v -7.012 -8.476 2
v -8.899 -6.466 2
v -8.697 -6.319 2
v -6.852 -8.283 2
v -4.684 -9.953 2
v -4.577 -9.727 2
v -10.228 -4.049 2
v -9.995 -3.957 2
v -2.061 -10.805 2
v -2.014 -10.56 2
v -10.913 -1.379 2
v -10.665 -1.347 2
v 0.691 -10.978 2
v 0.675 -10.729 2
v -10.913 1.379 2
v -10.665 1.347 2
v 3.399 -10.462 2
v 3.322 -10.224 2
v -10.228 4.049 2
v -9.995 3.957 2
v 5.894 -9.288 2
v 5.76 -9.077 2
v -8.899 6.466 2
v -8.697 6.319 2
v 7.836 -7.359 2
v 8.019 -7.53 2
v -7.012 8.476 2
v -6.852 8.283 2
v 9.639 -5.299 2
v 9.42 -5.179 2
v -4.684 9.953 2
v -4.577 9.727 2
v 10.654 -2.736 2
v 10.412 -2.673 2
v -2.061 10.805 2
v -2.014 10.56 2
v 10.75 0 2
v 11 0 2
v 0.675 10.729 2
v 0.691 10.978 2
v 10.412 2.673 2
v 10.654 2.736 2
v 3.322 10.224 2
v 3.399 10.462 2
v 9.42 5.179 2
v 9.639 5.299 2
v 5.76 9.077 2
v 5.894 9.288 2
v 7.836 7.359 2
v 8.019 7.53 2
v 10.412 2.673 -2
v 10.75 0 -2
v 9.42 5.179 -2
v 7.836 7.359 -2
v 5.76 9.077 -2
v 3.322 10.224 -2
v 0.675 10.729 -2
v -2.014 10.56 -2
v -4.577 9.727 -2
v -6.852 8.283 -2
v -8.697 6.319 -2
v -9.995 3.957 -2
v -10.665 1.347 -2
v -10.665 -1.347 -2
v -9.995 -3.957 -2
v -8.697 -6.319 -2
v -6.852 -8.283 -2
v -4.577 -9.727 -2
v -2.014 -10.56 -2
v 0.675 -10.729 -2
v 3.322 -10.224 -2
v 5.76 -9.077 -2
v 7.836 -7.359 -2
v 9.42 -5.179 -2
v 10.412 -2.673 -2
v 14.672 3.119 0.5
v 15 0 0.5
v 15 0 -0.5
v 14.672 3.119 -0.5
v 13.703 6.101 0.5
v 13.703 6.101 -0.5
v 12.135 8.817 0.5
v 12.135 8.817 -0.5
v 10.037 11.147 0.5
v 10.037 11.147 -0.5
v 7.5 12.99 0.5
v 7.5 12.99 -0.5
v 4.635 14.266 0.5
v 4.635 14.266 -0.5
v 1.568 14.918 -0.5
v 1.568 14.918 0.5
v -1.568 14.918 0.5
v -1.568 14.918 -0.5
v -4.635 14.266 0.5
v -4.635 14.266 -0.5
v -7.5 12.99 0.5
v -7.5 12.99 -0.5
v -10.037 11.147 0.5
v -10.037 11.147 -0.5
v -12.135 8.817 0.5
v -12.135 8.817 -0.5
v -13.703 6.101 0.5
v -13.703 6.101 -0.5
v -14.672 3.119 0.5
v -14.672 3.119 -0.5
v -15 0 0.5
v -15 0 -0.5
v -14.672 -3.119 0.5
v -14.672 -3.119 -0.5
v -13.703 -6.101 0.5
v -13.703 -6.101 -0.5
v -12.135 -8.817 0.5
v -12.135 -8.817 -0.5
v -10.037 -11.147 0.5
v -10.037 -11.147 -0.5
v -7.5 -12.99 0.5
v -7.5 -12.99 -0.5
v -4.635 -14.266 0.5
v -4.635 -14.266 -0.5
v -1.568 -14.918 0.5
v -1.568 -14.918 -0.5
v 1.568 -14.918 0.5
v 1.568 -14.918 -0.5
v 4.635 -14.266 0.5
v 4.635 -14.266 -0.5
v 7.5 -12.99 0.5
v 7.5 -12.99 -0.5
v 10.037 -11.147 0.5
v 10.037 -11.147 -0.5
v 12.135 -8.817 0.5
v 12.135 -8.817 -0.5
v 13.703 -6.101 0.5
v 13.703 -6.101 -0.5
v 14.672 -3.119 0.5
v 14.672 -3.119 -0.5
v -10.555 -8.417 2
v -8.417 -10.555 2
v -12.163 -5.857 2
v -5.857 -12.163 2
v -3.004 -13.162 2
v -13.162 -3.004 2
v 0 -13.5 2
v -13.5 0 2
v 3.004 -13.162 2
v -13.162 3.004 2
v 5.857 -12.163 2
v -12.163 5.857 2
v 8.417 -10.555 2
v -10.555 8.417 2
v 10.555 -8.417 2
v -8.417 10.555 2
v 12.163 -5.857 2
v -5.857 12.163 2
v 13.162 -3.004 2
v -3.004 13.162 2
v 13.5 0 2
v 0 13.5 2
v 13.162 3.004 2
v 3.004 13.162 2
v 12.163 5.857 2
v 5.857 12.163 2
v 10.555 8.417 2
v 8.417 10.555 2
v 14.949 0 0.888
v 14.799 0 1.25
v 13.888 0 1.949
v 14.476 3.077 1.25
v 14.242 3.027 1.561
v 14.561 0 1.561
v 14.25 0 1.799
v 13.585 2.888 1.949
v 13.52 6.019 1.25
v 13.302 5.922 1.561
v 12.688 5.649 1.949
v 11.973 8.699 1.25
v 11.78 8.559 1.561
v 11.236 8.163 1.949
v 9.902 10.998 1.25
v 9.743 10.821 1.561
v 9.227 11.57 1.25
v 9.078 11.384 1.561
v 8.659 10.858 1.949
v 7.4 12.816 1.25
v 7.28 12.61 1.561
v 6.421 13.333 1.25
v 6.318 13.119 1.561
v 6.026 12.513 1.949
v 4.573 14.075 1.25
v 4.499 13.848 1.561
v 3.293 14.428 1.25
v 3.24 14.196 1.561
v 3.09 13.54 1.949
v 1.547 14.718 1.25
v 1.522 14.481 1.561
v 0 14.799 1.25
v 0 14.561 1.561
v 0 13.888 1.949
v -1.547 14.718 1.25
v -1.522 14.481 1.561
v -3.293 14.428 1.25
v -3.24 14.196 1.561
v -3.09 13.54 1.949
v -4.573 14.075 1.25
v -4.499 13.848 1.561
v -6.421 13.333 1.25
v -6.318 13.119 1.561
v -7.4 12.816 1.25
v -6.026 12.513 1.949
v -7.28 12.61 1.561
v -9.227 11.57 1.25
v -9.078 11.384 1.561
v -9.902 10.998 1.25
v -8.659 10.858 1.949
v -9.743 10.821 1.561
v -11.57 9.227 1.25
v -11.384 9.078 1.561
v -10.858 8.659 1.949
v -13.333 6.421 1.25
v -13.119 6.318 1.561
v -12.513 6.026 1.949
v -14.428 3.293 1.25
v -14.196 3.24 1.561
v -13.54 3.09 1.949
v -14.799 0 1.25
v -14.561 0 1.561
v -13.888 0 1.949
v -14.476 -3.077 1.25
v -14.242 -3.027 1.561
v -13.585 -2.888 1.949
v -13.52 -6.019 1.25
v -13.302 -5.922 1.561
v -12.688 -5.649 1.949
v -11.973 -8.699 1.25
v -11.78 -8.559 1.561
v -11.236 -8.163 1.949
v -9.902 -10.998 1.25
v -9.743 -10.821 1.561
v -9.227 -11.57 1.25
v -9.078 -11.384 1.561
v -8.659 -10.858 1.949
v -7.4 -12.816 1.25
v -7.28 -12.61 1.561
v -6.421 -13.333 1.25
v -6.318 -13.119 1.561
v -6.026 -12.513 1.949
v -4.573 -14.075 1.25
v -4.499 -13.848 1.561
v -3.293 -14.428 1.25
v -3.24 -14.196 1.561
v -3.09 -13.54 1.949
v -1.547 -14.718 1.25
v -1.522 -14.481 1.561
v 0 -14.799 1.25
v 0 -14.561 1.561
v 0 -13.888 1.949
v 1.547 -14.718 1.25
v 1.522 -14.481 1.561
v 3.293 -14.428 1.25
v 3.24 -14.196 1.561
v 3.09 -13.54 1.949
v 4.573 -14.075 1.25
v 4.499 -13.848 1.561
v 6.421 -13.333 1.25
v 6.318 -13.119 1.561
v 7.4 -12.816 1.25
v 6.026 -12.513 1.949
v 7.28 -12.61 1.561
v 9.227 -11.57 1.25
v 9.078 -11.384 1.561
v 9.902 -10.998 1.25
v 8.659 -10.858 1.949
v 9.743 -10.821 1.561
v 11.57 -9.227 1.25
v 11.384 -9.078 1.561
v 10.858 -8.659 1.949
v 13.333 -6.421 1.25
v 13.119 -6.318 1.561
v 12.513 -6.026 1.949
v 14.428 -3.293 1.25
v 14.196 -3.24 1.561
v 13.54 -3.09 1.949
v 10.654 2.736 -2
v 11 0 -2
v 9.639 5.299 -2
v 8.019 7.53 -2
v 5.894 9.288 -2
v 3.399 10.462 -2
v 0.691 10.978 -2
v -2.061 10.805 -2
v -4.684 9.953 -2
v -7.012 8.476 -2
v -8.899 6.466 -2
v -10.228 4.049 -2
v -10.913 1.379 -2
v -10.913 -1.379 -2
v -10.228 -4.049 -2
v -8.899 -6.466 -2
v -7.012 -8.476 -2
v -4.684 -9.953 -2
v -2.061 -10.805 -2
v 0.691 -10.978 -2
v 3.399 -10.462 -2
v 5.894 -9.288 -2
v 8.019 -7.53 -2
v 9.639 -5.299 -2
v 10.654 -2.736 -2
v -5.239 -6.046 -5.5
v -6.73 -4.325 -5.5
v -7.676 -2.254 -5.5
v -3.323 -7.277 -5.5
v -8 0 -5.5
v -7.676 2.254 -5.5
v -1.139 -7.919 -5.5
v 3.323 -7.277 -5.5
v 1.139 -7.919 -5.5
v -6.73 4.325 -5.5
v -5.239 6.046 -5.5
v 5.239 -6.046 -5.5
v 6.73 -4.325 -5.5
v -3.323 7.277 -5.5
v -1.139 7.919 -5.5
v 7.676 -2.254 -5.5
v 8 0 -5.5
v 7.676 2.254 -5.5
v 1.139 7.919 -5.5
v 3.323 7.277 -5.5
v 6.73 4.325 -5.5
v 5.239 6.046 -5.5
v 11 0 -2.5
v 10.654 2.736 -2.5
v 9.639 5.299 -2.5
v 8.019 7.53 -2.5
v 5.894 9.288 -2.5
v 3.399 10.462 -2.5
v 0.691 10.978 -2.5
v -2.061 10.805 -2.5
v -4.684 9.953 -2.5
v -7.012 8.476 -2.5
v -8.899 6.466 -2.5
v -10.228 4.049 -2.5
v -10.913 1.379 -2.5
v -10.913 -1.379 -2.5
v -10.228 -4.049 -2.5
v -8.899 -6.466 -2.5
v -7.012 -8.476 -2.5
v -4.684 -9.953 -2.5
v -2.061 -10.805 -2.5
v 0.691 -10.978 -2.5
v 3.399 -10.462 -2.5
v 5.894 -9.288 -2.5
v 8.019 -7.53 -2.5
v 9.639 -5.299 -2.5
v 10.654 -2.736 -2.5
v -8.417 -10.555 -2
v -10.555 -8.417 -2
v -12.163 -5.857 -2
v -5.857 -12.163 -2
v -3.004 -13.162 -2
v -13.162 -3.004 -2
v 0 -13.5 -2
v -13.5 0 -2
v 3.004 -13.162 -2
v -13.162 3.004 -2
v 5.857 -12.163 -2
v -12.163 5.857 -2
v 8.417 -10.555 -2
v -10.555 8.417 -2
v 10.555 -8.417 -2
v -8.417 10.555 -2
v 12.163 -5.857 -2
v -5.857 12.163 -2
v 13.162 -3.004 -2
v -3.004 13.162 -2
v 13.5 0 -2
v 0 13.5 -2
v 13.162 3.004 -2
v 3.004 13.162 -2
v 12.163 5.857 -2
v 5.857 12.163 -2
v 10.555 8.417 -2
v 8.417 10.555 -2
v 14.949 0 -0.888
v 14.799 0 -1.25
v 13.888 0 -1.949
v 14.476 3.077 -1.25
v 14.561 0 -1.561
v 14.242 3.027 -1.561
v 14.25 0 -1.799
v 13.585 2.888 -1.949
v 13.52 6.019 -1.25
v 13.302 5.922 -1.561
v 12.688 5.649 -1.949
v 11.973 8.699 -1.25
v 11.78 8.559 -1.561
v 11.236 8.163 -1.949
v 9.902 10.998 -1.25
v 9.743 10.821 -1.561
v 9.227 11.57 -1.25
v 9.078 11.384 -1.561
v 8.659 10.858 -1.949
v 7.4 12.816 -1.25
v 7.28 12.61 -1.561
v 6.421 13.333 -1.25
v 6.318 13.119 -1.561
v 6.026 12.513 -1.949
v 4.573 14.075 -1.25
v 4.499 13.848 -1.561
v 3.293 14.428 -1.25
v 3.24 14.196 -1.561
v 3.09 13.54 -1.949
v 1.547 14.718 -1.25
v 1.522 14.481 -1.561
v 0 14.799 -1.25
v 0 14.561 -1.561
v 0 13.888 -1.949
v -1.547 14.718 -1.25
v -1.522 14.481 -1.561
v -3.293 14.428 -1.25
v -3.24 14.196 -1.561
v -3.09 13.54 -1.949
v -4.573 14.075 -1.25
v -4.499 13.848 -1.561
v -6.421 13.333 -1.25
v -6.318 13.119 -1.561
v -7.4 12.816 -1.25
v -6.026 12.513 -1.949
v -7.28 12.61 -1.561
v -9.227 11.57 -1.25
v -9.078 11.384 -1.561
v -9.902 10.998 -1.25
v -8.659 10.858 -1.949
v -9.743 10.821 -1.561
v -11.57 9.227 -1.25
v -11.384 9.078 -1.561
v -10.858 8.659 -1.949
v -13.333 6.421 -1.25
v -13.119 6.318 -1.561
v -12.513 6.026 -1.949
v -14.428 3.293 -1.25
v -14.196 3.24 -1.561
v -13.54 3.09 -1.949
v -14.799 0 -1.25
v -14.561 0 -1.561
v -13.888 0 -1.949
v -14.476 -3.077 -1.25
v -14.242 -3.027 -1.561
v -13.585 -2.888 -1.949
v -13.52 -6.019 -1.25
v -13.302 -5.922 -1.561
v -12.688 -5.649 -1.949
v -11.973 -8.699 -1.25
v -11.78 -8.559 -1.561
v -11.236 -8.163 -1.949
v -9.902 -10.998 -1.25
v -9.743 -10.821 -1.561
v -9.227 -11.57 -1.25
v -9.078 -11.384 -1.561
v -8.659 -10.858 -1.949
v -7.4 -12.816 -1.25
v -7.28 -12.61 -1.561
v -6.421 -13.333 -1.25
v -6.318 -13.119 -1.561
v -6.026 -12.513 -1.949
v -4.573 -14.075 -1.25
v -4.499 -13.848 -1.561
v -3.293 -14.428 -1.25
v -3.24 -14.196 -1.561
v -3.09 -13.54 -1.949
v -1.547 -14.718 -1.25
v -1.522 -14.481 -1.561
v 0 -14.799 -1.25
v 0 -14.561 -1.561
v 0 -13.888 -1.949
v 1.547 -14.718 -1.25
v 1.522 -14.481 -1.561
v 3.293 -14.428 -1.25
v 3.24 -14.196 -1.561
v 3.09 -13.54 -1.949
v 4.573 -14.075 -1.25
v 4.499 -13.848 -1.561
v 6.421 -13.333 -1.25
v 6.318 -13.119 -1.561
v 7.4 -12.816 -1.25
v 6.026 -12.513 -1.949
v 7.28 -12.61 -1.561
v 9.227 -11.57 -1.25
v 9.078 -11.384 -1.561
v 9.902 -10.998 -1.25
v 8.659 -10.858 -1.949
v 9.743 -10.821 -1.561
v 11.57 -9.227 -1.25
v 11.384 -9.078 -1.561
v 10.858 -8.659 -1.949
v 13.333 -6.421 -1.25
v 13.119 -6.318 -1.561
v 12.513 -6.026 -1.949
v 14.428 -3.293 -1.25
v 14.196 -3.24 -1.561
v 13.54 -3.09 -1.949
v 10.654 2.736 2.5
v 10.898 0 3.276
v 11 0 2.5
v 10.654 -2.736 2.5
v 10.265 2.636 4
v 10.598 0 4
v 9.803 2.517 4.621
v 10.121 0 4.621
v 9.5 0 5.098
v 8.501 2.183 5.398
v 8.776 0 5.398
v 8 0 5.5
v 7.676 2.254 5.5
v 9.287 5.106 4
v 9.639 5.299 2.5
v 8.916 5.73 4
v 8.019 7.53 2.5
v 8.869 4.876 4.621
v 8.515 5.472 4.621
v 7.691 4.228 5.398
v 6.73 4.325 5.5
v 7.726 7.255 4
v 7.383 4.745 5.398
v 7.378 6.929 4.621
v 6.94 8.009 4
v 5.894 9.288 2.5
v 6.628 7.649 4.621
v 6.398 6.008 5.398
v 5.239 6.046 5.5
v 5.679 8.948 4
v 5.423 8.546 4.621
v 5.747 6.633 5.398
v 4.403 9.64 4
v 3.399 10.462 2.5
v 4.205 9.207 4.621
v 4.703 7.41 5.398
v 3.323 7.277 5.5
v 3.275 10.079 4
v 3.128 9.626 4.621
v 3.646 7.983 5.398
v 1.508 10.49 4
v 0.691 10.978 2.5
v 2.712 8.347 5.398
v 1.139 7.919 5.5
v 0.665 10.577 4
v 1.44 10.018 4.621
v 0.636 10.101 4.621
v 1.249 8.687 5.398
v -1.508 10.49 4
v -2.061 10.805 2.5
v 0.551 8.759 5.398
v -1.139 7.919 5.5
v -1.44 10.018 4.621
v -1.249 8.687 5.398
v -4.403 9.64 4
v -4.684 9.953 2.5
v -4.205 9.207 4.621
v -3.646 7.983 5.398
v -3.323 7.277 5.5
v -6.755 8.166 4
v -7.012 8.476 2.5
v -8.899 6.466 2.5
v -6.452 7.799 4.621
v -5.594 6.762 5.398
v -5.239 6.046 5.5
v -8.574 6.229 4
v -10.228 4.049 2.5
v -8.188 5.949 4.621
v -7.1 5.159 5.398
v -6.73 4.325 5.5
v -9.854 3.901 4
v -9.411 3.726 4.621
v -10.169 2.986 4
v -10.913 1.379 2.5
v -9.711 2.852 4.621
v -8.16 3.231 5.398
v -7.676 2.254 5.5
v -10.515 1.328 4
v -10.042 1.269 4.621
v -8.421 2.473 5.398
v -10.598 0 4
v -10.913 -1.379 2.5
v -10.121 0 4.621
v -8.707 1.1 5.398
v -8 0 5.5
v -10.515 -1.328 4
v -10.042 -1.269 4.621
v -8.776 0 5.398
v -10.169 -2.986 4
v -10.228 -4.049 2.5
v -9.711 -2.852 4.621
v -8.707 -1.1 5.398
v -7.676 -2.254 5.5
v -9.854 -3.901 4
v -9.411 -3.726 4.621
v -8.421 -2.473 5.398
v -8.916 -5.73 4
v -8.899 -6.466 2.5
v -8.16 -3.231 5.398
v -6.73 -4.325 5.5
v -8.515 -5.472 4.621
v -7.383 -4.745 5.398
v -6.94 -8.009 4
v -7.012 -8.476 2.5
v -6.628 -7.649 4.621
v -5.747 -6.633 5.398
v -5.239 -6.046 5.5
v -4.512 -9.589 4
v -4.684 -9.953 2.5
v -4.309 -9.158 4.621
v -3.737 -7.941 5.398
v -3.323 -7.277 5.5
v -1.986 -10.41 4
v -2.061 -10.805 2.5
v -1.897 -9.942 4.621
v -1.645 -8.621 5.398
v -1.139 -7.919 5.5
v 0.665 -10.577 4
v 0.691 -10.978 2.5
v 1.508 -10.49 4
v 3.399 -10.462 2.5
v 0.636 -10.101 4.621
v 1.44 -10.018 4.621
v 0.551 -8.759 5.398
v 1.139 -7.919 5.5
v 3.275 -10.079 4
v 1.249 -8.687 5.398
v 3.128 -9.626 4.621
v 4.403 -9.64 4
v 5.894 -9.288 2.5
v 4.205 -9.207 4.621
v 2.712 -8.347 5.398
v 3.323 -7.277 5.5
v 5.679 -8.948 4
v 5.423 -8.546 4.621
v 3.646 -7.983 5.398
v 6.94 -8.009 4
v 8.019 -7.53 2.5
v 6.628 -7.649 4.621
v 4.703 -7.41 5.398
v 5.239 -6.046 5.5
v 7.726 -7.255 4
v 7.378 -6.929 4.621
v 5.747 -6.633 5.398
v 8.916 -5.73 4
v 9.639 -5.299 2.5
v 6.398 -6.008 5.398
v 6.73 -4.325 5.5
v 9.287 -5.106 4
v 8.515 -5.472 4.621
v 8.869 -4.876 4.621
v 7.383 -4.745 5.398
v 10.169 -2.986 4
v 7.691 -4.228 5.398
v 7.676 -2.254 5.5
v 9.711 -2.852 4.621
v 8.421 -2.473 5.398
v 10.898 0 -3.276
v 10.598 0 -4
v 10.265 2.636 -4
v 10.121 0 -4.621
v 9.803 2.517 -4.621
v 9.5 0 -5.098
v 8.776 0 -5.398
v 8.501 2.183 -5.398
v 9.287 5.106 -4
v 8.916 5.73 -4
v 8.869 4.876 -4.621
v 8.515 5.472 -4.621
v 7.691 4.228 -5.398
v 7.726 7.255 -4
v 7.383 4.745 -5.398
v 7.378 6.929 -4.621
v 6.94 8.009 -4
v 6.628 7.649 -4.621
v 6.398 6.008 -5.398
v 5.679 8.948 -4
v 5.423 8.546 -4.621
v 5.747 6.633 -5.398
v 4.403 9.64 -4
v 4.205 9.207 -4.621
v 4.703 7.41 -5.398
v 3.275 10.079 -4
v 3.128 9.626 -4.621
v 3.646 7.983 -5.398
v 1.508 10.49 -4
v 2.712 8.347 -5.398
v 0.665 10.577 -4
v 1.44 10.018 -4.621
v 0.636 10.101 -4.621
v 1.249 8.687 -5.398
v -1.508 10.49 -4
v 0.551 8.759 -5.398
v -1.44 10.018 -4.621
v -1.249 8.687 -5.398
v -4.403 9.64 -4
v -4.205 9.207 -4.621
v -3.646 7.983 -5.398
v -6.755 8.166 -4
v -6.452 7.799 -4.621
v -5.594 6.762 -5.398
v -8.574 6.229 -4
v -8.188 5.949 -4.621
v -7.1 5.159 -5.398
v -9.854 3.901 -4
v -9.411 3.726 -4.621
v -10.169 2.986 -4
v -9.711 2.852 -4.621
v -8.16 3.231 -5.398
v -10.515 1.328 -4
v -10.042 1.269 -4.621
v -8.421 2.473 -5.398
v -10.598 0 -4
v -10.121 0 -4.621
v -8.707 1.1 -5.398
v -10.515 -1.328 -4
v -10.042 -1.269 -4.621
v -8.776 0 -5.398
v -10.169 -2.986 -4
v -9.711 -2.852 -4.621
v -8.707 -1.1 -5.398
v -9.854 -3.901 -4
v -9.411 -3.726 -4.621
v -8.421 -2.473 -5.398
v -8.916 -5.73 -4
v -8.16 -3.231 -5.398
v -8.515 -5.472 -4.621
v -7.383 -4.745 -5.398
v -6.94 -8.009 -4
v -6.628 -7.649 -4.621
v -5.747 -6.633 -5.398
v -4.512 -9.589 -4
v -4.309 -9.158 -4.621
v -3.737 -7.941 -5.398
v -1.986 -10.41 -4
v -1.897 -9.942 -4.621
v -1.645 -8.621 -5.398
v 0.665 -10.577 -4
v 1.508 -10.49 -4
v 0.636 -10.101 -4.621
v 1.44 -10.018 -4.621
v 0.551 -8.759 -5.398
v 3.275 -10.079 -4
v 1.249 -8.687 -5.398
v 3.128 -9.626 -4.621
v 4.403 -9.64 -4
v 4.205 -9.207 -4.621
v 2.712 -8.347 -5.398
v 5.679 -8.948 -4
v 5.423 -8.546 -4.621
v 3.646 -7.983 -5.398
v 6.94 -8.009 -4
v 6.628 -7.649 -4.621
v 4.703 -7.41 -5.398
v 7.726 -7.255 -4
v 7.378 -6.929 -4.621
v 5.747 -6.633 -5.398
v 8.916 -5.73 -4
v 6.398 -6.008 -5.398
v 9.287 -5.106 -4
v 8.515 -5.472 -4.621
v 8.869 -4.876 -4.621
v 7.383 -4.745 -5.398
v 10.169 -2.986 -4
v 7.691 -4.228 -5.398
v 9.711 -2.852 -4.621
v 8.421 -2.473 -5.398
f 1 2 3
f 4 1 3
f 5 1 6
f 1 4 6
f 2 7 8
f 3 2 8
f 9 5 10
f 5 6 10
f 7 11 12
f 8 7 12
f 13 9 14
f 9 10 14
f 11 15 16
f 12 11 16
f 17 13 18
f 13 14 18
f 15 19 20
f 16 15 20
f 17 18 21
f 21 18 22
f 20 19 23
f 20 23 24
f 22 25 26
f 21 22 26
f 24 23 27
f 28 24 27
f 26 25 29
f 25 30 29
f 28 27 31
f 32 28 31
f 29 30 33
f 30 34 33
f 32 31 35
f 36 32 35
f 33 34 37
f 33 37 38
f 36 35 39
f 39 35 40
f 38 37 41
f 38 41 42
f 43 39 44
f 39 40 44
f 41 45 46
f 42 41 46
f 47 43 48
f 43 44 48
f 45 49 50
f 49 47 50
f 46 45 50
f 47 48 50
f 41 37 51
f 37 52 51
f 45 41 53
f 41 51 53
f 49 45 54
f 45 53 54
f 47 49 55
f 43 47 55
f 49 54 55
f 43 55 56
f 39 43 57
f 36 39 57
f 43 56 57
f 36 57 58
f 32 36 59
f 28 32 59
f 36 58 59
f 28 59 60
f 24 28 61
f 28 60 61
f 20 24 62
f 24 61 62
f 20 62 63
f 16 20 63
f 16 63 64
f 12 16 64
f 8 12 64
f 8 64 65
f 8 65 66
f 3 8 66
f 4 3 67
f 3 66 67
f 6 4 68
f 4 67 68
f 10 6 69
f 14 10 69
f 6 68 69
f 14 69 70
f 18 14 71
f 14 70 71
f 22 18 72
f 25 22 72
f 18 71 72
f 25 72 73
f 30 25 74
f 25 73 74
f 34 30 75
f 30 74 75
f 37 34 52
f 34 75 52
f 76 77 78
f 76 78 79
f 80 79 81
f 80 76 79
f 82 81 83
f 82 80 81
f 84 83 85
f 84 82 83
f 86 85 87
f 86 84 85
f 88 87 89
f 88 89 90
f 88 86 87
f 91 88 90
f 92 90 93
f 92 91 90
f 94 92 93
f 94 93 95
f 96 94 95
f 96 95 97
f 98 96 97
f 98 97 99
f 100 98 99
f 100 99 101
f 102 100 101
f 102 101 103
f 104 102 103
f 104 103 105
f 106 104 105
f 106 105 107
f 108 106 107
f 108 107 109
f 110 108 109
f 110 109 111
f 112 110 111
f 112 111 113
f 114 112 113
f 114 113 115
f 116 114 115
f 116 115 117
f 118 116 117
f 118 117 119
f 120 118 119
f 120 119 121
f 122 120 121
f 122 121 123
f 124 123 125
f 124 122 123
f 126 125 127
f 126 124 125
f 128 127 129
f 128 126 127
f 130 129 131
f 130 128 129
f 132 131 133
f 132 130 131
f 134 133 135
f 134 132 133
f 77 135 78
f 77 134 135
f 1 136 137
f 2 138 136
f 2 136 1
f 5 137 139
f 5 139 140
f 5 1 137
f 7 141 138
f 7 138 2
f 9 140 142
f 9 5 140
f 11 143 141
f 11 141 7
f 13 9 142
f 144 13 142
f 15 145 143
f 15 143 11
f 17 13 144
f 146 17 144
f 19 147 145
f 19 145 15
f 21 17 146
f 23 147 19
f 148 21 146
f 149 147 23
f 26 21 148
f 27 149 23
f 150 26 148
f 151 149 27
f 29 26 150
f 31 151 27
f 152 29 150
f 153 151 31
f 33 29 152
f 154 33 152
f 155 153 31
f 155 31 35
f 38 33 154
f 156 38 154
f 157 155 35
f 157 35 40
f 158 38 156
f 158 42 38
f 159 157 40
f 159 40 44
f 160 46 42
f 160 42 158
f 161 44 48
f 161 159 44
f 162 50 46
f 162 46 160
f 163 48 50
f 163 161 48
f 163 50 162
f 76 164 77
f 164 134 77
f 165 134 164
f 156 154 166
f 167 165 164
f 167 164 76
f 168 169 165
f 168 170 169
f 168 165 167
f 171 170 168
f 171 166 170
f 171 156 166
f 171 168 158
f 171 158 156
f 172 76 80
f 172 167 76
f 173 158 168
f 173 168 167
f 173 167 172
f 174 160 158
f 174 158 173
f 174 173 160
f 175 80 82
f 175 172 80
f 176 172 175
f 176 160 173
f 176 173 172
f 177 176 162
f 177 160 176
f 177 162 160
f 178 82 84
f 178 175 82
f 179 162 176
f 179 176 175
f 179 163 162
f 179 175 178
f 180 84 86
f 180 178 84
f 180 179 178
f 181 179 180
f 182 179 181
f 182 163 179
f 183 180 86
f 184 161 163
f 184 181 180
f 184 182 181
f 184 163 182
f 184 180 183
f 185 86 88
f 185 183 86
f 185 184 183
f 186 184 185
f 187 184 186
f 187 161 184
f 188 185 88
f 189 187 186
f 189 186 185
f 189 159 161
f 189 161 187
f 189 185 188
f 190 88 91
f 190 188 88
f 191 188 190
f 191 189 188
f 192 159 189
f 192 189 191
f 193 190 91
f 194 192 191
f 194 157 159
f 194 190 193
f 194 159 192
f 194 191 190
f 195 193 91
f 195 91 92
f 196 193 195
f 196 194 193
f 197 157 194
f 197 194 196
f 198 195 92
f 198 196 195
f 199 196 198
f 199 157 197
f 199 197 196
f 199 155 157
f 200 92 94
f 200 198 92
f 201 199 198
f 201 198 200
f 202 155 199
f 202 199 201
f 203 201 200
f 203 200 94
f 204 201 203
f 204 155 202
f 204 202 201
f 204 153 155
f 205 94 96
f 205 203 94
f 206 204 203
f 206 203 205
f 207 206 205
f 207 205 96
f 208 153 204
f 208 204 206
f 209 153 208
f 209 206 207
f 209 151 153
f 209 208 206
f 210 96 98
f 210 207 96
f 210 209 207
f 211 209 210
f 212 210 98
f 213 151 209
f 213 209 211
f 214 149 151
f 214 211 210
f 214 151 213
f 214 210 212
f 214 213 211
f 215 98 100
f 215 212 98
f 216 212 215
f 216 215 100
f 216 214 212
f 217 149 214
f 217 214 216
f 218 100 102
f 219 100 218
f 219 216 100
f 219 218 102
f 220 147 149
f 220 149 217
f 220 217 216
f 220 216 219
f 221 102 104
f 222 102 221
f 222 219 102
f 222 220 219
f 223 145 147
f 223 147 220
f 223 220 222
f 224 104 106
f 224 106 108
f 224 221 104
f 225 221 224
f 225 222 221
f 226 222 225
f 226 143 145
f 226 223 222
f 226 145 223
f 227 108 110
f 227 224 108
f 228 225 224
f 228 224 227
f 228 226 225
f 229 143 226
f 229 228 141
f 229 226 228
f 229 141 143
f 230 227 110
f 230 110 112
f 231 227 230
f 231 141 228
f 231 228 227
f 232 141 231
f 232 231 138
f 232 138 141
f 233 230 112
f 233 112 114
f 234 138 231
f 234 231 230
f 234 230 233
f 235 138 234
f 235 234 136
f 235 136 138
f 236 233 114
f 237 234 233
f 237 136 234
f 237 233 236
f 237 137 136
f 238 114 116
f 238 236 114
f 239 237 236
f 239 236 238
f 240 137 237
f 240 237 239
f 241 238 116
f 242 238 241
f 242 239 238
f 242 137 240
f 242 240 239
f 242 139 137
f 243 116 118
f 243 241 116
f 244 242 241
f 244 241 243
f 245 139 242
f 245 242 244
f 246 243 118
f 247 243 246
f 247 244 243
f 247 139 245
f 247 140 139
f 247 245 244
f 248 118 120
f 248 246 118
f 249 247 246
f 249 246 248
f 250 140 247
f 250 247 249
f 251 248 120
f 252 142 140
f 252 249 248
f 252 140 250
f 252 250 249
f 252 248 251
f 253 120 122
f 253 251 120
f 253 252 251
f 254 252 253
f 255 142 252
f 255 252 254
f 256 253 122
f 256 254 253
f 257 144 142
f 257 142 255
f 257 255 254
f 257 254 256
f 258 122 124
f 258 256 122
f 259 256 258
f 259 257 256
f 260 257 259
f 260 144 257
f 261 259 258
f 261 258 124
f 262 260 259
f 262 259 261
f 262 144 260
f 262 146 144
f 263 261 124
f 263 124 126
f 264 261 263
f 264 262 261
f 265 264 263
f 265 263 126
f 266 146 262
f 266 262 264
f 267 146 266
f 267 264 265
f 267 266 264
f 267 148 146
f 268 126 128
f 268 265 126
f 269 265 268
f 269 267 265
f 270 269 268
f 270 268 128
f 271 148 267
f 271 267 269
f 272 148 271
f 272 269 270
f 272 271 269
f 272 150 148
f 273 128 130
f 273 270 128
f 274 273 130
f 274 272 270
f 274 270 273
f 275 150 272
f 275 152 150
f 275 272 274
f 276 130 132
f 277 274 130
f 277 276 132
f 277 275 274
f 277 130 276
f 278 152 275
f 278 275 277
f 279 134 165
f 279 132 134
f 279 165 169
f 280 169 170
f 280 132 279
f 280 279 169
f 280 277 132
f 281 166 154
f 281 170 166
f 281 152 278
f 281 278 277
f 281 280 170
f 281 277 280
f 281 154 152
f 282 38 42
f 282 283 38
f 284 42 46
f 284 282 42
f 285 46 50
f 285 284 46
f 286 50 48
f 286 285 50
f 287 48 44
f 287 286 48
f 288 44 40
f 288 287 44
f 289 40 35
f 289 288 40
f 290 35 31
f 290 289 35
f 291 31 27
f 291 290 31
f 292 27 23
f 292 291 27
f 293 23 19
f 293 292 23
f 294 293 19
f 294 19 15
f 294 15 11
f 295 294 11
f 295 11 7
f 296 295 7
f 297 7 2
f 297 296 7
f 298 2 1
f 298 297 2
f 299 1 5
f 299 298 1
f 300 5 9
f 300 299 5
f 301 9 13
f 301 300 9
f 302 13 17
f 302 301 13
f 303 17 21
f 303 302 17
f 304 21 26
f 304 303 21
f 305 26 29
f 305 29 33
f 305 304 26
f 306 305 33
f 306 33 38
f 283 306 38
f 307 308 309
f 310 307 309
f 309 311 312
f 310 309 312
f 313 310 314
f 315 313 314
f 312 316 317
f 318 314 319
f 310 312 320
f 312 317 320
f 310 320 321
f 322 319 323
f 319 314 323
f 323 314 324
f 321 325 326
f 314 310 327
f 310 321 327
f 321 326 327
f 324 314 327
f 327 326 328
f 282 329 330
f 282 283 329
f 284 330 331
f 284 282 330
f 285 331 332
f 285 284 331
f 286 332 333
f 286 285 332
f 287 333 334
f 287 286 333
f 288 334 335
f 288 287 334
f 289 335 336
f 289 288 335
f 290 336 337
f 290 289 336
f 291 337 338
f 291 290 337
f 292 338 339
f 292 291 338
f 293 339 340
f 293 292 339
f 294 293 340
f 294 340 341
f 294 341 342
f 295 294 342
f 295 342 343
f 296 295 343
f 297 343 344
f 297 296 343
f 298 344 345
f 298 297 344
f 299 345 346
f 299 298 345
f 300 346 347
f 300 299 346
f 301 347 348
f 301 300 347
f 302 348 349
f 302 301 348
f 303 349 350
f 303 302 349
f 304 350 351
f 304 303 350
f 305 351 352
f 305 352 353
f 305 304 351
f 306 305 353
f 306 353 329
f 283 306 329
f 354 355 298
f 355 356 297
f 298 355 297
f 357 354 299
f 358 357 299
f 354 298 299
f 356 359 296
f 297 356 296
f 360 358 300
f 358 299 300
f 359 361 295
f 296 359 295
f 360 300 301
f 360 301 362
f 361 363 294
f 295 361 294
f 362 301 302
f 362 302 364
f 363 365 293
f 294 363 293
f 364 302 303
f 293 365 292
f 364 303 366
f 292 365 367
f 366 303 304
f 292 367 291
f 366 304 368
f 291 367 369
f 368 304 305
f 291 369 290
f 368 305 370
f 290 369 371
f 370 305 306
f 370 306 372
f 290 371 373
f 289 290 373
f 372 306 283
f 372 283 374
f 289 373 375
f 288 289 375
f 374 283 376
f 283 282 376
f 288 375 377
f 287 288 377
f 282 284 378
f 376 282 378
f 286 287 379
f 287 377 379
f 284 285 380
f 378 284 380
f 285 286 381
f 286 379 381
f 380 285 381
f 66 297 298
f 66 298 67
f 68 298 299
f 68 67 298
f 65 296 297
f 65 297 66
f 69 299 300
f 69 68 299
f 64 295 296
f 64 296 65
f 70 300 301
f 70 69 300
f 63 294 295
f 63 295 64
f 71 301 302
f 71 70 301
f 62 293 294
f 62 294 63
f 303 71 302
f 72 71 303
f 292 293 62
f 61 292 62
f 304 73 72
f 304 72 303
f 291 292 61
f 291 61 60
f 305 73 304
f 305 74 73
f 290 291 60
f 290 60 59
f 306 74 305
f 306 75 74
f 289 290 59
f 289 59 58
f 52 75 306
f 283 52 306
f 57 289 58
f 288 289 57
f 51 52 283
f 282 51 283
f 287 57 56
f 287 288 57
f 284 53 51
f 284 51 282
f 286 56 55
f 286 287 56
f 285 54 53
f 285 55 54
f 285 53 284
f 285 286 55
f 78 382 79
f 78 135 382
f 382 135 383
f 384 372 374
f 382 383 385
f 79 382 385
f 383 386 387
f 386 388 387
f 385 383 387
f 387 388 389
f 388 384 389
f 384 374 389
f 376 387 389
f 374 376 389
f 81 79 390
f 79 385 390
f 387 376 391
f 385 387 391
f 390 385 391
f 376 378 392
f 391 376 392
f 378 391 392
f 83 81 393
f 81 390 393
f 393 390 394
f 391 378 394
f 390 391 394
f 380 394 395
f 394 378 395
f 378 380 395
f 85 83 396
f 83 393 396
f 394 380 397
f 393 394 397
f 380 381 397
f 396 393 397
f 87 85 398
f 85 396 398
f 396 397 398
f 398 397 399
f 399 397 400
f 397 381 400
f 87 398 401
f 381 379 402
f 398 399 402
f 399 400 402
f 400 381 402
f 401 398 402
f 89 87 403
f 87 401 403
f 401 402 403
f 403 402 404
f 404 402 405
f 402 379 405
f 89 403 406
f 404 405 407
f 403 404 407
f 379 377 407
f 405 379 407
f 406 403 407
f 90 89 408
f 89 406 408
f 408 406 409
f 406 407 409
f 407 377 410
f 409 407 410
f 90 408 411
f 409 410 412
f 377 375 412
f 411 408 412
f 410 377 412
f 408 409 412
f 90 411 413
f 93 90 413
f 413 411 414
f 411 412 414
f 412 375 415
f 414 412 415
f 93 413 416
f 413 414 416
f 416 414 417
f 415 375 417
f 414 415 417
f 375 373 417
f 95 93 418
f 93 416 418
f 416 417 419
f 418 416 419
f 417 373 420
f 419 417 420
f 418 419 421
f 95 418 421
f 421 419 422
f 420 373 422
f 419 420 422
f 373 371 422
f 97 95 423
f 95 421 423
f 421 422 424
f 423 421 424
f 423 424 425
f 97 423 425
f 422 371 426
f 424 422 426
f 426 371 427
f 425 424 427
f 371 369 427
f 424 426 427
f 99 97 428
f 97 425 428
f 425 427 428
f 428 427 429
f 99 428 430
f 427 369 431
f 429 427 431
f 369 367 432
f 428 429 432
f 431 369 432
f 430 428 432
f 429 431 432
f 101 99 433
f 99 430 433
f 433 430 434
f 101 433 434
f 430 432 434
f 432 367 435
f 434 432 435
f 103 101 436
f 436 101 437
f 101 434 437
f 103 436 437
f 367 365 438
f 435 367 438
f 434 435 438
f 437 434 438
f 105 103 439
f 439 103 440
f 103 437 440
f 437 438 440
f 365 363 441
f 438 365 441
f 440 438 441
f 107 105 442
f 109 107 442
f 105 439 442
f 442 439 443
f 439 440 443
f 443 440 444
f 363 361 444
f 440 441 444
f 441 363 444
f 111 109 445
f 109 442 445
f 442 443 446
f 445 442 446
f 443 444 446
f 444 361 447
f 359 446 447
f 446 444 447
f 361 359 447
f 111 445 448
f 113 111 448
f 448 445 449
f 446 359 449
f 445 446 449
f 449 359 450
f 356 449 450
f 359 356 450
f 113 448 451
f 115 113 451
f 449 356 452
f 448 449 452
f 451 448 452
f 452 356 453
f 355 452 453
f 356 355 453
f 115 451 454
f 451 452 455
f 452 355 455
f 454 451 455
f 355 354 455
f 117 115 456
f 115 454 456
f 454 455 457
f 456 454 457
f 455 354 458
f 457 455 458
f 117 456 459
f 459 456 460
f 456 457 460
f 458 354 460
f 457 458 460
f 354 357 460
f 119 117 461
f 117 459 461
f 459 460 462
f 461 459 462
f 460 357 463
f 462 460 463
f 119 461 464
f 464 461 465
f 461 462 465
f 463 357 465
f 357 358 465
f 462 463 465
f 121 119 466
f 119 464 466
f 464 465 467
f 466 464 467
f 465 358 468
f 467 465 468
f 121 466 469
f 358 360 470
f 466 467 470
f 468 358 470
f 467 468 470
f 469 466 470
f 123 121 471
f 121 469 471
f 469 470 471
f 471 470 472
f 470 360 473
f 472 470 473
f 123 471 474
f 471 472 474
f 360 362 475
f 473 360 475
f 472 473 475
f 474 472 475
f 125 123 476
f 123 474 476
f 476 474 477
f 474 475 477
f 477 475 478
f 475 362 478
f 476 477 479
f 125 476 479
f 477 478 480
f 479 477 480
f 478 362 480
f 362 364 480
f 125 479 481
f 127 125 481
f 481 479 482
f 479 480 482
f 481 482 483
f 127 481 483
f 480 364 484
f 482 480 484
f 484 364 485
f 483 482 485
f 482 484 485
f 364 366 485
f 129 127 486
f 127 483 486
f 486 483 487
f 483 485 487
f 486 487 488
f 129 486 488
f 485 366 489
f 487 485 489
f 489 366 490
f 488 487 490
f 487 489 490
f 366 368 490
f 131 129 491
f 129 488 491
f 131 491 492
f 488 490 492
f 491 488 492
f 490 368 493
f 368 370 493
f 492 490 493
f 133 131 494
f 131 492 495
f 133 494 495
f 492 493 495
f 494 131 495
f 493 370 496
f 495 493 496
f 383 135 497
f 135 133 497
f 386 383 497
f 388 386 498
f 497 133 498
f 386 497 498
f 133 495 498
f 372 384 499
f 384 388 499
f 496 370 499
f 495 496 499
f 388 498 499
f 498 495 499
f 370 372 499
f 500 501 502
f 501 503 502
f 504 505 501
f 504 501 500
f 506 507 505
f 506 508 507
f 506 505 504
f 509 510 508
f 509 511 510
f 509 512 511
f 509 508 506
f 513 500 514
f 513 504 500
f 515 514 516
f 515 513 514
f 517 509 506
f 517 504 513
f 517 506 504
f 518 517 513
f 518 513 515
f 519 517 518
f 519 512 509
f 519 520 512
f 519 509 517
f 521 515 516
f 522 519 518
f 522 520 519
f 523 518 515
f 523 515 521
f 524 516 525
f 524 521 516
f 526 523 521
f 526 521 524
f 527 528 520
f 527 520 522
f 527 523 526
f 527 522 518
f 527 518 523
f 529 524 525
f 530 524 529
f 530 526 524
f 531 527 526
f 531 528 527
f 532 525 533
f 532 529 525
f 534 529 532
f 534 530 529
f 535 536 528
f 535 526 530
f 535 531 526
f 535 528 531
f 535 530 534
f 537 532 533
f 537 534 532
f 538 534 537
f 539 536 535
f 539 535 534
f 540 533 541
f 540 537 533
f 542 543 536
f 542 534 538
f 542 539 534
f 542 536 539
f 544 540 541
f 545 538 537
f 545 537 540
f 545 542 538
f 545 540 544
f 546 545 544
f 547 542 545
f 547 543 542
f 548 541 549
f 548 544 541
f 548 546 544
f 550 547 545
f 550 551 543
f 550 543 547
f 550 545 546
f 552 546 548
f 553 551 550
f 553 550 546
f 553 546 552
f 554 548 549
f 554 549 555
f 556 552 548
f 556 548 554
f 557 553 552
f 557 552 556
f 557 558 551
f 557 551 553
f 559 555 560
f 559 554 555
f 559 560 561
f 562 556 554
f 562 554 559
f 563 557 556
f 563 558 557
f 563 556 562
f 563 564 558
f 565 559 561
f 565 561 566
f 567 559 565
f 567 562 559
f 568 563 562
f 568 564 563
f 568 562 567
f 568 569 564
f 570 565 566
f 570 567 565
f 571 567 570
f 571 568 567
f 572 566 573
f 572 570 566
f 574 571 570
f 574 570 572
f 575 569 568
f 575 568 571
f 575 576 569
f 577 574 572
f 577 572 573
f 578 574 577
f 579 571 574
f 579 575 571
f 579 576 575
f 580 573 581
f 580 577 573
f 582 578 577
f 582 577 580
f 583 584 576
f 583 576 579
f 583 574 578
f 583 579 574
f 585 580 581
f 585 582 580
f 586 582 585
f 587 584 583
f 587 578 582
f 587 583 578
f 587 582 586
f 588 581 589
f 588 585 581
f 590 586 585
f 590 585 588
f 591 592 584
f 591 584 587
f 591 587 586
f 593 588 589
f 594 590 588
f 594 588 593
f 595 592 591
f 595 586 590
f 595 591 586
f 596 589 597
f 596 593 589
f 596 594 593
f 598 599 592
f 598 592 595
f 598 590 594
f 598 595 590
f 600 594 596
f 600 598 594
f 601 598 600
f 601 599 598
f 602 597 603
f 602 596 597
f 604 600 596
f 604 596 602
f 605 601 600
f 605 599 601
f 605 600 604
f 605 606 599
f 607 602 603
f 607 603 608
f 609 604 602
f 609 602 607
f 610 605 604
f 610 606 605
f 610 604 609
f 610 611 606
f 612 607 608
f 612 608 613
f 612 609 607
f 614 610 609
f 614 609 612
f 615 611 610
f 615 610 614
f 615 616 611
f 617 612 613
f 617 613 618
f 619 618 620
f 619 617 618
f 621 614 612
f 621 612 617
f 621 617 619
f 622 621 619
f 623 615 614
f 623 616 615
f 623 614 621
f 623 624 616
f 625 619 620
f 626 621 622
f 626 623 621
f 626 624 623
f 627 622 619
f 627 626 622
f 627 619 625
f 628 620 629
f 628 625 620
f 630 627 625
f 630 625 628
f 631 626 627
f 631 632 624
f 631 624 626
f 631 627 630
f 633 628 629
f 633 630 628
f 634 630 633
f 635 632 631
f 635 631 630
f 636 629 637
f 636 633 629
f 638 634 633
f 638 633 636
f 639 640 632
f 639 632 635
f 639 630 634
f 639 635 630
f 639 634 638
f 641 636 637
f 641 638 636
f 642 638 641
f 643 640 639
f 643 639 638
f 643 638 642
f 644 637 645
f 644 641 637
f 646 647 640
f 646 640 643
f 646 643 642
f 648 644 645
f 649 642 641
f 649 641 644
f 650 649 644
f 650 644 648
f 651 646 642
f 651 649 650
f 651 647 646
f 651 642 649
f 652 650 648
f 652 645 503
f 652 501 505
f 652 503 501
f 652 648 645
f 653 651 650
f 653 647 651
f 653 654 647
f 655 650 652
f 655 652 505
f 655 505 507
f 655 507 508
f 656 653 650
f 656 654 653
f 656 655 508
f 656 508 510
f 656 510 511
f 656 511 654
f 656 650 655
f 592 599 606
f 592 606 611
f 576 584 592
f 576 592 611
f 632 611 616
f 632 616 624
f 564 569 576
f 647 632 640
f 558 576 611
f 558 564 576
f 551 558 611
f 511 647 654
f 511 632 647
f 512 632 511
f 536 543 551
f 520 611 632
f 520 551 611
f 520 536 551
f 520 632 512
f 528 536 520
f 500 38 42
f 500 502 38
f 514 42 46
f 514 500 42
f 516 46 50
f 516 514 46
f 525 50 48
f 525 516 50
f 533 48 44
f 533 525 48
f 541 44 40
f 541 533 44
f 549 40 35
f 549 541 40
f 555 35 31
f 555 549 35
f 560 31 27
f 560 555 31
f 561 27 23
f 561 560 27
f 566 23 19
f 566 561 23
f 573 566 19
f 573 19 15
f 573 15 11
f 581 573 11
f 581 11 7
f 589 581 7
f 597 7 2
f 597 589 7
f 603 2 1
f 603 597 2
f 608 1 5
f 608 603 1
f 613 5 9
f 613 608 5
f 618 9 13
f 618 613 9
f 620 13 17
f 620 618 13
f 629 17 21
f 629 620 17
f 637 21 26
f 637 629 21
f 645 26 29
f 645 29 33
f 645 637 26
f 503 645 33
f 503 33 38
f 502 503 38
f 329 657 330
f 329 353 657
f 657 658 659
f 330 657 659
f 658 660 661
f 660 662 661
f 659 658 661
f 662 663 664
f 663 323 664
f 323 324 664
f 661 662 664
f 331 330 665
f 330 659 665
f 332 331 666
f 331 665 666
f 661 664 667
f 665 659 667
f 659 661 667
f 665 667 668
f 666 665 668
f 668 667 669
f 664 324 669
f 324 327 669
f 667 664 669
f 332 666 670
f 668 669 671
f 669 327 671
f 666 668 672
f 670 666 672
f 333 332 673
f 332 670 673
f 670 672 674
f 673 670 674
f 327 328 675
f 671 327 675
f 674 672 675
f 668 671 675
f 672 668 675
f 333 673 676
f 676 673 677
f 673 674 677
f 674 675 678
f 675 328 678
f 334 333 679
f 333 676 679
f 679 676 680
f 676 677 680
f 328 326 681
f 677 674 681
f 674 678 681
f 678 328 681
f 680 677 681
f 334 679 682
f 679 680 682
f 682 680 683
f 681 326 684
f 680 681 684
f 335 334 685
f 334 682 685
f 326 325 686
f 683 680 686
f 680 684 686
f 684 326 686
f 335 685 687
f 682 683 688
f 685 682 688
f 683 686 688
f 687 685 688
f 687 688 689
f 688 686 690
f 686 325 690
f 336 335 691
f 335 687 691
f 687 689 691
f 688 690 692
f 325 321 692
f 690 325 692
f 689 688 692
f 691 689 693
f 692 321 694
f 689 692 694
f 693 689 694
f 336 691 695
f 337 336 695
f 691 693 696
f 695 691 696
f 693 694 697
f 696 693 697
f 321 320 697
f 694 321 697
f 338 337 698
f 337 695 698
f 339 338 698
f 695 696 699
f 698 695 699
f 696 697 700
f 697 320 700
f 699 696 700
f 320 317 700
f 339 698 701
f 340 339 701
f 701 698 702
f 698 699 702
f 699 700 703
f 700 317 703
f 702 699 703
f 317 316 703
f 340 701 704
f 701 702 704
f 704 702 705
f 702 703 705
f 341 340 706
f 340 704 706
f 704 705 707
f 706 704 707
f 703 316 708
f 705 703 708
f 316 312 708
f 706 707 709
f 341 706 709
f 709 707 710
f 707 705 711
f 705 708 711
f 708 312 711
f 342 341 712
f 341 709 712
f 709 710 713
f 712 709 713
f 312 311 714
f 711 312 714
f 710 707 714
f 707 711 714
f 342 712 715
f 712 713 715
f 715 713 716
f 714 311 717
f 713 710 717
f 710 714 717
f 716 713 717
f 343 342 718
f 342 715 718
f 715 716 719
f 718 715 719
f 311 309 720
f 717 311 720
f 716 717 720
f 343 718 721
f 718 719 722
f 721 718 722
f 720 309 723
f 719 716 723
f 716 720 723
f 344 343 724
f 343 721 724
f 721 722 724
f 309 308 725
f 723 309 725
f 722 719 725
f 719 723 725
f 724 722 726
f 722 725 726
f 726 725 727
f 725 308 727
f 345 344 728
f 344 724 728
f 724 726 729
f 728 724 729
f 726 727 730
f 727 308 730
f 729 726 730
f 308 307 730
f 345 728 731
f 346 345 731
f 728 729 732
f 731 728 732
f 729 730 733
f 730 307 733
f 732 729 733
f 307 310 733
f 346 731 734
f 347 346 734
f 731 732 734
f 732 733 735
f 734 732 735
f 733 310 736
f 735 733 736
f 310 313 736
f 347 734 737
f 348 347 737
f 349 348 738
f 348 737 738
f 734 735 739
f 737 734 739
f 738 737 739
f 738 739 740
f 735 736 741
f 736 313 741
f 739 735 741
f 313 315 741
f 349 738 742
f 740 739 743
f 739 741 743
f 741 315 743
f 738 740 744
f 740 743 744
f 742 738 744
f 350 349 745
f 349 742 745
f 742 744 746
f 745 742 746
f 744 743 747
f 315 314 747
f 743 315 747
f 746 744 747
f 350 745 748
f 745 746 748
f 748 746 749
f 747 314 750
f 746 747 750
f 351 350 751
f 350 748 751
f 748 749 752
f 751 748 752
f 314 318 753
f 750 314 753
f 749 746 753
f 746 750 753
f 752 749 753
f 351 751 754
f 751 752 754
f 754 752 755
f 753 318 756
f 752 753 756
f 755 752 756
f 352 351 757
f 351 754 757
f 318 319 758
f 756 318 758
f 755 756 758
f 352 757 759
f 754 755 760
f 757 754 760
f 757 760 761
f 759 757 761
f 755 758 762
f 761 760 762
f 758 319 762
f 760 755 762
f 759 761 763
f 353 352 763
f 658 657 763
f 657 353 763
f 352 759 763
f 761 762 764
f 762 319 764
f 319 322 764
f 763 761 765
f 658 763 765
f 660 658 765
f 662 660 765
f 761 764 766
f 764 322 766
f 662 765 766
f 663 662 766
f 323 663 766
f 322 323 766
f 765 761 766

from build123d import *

# Parameters (mm, degrees)
F2_R     = 15
F2_R_2   = 11
F3_DEPTH = 2
F4_R     = 11
F5_DEPTH = 5.5
F6_R     = 3
F7_R     = 1.5
F8_R     = 15
F8_R_2   = 10.75
F9_DEPTH = 2


with BuildPart() as f3:
    # F2 (on Top) → F3 (new body, symmetric)
    with BuildSketch(Plane.XY):
        Circle(F2_R)
        Circle(F2_R_2, mode=Mode.SUBTRACT)
    extrude(amount=F3_DEPTH, both=True)

    # F7
    f7_edges = [f3.edges().sort_by_distance(p)[0] for p in [
        (-15, 0, -2),
        (15, 0, 0),
        (-15, 0, 2),
    ]]
    fillet(f7_edges, radius=F7_R)


with BuildPart() as f5:
    # F4 (on Top) → F5 (new body, symmetric)
    with BuildSketch(Plane.XY):
        Circle(F4_R)
    extrude(amount=F5_DEPTH, both=True)

    # F6
    f6_edges = [f5.edges().sort_by_distance(p)[0] for p in [
        (-11, 0, 5.5),
        (-11, 0, -5.5),
    ]]
    fillet(f6_edges, radius=F6_R)


with BuildPart() as f9:
    # F8 (on Top) → F9 (new body, symmetric)
    with BuildSketch(Plane.XY):
        Circle(F8_R)
        Circle(F8_R_2, mode=Mode.SUBTRACT)
    extrude(amount=F9_DEPTH, both=True)


with BuildPart() as f5_1:
    add(f5.part)

    # F10: cut F9
    add(f9.part, mode=Mode.SUBTRACT)


solid = Compound([f3.part, f5_1.part])
